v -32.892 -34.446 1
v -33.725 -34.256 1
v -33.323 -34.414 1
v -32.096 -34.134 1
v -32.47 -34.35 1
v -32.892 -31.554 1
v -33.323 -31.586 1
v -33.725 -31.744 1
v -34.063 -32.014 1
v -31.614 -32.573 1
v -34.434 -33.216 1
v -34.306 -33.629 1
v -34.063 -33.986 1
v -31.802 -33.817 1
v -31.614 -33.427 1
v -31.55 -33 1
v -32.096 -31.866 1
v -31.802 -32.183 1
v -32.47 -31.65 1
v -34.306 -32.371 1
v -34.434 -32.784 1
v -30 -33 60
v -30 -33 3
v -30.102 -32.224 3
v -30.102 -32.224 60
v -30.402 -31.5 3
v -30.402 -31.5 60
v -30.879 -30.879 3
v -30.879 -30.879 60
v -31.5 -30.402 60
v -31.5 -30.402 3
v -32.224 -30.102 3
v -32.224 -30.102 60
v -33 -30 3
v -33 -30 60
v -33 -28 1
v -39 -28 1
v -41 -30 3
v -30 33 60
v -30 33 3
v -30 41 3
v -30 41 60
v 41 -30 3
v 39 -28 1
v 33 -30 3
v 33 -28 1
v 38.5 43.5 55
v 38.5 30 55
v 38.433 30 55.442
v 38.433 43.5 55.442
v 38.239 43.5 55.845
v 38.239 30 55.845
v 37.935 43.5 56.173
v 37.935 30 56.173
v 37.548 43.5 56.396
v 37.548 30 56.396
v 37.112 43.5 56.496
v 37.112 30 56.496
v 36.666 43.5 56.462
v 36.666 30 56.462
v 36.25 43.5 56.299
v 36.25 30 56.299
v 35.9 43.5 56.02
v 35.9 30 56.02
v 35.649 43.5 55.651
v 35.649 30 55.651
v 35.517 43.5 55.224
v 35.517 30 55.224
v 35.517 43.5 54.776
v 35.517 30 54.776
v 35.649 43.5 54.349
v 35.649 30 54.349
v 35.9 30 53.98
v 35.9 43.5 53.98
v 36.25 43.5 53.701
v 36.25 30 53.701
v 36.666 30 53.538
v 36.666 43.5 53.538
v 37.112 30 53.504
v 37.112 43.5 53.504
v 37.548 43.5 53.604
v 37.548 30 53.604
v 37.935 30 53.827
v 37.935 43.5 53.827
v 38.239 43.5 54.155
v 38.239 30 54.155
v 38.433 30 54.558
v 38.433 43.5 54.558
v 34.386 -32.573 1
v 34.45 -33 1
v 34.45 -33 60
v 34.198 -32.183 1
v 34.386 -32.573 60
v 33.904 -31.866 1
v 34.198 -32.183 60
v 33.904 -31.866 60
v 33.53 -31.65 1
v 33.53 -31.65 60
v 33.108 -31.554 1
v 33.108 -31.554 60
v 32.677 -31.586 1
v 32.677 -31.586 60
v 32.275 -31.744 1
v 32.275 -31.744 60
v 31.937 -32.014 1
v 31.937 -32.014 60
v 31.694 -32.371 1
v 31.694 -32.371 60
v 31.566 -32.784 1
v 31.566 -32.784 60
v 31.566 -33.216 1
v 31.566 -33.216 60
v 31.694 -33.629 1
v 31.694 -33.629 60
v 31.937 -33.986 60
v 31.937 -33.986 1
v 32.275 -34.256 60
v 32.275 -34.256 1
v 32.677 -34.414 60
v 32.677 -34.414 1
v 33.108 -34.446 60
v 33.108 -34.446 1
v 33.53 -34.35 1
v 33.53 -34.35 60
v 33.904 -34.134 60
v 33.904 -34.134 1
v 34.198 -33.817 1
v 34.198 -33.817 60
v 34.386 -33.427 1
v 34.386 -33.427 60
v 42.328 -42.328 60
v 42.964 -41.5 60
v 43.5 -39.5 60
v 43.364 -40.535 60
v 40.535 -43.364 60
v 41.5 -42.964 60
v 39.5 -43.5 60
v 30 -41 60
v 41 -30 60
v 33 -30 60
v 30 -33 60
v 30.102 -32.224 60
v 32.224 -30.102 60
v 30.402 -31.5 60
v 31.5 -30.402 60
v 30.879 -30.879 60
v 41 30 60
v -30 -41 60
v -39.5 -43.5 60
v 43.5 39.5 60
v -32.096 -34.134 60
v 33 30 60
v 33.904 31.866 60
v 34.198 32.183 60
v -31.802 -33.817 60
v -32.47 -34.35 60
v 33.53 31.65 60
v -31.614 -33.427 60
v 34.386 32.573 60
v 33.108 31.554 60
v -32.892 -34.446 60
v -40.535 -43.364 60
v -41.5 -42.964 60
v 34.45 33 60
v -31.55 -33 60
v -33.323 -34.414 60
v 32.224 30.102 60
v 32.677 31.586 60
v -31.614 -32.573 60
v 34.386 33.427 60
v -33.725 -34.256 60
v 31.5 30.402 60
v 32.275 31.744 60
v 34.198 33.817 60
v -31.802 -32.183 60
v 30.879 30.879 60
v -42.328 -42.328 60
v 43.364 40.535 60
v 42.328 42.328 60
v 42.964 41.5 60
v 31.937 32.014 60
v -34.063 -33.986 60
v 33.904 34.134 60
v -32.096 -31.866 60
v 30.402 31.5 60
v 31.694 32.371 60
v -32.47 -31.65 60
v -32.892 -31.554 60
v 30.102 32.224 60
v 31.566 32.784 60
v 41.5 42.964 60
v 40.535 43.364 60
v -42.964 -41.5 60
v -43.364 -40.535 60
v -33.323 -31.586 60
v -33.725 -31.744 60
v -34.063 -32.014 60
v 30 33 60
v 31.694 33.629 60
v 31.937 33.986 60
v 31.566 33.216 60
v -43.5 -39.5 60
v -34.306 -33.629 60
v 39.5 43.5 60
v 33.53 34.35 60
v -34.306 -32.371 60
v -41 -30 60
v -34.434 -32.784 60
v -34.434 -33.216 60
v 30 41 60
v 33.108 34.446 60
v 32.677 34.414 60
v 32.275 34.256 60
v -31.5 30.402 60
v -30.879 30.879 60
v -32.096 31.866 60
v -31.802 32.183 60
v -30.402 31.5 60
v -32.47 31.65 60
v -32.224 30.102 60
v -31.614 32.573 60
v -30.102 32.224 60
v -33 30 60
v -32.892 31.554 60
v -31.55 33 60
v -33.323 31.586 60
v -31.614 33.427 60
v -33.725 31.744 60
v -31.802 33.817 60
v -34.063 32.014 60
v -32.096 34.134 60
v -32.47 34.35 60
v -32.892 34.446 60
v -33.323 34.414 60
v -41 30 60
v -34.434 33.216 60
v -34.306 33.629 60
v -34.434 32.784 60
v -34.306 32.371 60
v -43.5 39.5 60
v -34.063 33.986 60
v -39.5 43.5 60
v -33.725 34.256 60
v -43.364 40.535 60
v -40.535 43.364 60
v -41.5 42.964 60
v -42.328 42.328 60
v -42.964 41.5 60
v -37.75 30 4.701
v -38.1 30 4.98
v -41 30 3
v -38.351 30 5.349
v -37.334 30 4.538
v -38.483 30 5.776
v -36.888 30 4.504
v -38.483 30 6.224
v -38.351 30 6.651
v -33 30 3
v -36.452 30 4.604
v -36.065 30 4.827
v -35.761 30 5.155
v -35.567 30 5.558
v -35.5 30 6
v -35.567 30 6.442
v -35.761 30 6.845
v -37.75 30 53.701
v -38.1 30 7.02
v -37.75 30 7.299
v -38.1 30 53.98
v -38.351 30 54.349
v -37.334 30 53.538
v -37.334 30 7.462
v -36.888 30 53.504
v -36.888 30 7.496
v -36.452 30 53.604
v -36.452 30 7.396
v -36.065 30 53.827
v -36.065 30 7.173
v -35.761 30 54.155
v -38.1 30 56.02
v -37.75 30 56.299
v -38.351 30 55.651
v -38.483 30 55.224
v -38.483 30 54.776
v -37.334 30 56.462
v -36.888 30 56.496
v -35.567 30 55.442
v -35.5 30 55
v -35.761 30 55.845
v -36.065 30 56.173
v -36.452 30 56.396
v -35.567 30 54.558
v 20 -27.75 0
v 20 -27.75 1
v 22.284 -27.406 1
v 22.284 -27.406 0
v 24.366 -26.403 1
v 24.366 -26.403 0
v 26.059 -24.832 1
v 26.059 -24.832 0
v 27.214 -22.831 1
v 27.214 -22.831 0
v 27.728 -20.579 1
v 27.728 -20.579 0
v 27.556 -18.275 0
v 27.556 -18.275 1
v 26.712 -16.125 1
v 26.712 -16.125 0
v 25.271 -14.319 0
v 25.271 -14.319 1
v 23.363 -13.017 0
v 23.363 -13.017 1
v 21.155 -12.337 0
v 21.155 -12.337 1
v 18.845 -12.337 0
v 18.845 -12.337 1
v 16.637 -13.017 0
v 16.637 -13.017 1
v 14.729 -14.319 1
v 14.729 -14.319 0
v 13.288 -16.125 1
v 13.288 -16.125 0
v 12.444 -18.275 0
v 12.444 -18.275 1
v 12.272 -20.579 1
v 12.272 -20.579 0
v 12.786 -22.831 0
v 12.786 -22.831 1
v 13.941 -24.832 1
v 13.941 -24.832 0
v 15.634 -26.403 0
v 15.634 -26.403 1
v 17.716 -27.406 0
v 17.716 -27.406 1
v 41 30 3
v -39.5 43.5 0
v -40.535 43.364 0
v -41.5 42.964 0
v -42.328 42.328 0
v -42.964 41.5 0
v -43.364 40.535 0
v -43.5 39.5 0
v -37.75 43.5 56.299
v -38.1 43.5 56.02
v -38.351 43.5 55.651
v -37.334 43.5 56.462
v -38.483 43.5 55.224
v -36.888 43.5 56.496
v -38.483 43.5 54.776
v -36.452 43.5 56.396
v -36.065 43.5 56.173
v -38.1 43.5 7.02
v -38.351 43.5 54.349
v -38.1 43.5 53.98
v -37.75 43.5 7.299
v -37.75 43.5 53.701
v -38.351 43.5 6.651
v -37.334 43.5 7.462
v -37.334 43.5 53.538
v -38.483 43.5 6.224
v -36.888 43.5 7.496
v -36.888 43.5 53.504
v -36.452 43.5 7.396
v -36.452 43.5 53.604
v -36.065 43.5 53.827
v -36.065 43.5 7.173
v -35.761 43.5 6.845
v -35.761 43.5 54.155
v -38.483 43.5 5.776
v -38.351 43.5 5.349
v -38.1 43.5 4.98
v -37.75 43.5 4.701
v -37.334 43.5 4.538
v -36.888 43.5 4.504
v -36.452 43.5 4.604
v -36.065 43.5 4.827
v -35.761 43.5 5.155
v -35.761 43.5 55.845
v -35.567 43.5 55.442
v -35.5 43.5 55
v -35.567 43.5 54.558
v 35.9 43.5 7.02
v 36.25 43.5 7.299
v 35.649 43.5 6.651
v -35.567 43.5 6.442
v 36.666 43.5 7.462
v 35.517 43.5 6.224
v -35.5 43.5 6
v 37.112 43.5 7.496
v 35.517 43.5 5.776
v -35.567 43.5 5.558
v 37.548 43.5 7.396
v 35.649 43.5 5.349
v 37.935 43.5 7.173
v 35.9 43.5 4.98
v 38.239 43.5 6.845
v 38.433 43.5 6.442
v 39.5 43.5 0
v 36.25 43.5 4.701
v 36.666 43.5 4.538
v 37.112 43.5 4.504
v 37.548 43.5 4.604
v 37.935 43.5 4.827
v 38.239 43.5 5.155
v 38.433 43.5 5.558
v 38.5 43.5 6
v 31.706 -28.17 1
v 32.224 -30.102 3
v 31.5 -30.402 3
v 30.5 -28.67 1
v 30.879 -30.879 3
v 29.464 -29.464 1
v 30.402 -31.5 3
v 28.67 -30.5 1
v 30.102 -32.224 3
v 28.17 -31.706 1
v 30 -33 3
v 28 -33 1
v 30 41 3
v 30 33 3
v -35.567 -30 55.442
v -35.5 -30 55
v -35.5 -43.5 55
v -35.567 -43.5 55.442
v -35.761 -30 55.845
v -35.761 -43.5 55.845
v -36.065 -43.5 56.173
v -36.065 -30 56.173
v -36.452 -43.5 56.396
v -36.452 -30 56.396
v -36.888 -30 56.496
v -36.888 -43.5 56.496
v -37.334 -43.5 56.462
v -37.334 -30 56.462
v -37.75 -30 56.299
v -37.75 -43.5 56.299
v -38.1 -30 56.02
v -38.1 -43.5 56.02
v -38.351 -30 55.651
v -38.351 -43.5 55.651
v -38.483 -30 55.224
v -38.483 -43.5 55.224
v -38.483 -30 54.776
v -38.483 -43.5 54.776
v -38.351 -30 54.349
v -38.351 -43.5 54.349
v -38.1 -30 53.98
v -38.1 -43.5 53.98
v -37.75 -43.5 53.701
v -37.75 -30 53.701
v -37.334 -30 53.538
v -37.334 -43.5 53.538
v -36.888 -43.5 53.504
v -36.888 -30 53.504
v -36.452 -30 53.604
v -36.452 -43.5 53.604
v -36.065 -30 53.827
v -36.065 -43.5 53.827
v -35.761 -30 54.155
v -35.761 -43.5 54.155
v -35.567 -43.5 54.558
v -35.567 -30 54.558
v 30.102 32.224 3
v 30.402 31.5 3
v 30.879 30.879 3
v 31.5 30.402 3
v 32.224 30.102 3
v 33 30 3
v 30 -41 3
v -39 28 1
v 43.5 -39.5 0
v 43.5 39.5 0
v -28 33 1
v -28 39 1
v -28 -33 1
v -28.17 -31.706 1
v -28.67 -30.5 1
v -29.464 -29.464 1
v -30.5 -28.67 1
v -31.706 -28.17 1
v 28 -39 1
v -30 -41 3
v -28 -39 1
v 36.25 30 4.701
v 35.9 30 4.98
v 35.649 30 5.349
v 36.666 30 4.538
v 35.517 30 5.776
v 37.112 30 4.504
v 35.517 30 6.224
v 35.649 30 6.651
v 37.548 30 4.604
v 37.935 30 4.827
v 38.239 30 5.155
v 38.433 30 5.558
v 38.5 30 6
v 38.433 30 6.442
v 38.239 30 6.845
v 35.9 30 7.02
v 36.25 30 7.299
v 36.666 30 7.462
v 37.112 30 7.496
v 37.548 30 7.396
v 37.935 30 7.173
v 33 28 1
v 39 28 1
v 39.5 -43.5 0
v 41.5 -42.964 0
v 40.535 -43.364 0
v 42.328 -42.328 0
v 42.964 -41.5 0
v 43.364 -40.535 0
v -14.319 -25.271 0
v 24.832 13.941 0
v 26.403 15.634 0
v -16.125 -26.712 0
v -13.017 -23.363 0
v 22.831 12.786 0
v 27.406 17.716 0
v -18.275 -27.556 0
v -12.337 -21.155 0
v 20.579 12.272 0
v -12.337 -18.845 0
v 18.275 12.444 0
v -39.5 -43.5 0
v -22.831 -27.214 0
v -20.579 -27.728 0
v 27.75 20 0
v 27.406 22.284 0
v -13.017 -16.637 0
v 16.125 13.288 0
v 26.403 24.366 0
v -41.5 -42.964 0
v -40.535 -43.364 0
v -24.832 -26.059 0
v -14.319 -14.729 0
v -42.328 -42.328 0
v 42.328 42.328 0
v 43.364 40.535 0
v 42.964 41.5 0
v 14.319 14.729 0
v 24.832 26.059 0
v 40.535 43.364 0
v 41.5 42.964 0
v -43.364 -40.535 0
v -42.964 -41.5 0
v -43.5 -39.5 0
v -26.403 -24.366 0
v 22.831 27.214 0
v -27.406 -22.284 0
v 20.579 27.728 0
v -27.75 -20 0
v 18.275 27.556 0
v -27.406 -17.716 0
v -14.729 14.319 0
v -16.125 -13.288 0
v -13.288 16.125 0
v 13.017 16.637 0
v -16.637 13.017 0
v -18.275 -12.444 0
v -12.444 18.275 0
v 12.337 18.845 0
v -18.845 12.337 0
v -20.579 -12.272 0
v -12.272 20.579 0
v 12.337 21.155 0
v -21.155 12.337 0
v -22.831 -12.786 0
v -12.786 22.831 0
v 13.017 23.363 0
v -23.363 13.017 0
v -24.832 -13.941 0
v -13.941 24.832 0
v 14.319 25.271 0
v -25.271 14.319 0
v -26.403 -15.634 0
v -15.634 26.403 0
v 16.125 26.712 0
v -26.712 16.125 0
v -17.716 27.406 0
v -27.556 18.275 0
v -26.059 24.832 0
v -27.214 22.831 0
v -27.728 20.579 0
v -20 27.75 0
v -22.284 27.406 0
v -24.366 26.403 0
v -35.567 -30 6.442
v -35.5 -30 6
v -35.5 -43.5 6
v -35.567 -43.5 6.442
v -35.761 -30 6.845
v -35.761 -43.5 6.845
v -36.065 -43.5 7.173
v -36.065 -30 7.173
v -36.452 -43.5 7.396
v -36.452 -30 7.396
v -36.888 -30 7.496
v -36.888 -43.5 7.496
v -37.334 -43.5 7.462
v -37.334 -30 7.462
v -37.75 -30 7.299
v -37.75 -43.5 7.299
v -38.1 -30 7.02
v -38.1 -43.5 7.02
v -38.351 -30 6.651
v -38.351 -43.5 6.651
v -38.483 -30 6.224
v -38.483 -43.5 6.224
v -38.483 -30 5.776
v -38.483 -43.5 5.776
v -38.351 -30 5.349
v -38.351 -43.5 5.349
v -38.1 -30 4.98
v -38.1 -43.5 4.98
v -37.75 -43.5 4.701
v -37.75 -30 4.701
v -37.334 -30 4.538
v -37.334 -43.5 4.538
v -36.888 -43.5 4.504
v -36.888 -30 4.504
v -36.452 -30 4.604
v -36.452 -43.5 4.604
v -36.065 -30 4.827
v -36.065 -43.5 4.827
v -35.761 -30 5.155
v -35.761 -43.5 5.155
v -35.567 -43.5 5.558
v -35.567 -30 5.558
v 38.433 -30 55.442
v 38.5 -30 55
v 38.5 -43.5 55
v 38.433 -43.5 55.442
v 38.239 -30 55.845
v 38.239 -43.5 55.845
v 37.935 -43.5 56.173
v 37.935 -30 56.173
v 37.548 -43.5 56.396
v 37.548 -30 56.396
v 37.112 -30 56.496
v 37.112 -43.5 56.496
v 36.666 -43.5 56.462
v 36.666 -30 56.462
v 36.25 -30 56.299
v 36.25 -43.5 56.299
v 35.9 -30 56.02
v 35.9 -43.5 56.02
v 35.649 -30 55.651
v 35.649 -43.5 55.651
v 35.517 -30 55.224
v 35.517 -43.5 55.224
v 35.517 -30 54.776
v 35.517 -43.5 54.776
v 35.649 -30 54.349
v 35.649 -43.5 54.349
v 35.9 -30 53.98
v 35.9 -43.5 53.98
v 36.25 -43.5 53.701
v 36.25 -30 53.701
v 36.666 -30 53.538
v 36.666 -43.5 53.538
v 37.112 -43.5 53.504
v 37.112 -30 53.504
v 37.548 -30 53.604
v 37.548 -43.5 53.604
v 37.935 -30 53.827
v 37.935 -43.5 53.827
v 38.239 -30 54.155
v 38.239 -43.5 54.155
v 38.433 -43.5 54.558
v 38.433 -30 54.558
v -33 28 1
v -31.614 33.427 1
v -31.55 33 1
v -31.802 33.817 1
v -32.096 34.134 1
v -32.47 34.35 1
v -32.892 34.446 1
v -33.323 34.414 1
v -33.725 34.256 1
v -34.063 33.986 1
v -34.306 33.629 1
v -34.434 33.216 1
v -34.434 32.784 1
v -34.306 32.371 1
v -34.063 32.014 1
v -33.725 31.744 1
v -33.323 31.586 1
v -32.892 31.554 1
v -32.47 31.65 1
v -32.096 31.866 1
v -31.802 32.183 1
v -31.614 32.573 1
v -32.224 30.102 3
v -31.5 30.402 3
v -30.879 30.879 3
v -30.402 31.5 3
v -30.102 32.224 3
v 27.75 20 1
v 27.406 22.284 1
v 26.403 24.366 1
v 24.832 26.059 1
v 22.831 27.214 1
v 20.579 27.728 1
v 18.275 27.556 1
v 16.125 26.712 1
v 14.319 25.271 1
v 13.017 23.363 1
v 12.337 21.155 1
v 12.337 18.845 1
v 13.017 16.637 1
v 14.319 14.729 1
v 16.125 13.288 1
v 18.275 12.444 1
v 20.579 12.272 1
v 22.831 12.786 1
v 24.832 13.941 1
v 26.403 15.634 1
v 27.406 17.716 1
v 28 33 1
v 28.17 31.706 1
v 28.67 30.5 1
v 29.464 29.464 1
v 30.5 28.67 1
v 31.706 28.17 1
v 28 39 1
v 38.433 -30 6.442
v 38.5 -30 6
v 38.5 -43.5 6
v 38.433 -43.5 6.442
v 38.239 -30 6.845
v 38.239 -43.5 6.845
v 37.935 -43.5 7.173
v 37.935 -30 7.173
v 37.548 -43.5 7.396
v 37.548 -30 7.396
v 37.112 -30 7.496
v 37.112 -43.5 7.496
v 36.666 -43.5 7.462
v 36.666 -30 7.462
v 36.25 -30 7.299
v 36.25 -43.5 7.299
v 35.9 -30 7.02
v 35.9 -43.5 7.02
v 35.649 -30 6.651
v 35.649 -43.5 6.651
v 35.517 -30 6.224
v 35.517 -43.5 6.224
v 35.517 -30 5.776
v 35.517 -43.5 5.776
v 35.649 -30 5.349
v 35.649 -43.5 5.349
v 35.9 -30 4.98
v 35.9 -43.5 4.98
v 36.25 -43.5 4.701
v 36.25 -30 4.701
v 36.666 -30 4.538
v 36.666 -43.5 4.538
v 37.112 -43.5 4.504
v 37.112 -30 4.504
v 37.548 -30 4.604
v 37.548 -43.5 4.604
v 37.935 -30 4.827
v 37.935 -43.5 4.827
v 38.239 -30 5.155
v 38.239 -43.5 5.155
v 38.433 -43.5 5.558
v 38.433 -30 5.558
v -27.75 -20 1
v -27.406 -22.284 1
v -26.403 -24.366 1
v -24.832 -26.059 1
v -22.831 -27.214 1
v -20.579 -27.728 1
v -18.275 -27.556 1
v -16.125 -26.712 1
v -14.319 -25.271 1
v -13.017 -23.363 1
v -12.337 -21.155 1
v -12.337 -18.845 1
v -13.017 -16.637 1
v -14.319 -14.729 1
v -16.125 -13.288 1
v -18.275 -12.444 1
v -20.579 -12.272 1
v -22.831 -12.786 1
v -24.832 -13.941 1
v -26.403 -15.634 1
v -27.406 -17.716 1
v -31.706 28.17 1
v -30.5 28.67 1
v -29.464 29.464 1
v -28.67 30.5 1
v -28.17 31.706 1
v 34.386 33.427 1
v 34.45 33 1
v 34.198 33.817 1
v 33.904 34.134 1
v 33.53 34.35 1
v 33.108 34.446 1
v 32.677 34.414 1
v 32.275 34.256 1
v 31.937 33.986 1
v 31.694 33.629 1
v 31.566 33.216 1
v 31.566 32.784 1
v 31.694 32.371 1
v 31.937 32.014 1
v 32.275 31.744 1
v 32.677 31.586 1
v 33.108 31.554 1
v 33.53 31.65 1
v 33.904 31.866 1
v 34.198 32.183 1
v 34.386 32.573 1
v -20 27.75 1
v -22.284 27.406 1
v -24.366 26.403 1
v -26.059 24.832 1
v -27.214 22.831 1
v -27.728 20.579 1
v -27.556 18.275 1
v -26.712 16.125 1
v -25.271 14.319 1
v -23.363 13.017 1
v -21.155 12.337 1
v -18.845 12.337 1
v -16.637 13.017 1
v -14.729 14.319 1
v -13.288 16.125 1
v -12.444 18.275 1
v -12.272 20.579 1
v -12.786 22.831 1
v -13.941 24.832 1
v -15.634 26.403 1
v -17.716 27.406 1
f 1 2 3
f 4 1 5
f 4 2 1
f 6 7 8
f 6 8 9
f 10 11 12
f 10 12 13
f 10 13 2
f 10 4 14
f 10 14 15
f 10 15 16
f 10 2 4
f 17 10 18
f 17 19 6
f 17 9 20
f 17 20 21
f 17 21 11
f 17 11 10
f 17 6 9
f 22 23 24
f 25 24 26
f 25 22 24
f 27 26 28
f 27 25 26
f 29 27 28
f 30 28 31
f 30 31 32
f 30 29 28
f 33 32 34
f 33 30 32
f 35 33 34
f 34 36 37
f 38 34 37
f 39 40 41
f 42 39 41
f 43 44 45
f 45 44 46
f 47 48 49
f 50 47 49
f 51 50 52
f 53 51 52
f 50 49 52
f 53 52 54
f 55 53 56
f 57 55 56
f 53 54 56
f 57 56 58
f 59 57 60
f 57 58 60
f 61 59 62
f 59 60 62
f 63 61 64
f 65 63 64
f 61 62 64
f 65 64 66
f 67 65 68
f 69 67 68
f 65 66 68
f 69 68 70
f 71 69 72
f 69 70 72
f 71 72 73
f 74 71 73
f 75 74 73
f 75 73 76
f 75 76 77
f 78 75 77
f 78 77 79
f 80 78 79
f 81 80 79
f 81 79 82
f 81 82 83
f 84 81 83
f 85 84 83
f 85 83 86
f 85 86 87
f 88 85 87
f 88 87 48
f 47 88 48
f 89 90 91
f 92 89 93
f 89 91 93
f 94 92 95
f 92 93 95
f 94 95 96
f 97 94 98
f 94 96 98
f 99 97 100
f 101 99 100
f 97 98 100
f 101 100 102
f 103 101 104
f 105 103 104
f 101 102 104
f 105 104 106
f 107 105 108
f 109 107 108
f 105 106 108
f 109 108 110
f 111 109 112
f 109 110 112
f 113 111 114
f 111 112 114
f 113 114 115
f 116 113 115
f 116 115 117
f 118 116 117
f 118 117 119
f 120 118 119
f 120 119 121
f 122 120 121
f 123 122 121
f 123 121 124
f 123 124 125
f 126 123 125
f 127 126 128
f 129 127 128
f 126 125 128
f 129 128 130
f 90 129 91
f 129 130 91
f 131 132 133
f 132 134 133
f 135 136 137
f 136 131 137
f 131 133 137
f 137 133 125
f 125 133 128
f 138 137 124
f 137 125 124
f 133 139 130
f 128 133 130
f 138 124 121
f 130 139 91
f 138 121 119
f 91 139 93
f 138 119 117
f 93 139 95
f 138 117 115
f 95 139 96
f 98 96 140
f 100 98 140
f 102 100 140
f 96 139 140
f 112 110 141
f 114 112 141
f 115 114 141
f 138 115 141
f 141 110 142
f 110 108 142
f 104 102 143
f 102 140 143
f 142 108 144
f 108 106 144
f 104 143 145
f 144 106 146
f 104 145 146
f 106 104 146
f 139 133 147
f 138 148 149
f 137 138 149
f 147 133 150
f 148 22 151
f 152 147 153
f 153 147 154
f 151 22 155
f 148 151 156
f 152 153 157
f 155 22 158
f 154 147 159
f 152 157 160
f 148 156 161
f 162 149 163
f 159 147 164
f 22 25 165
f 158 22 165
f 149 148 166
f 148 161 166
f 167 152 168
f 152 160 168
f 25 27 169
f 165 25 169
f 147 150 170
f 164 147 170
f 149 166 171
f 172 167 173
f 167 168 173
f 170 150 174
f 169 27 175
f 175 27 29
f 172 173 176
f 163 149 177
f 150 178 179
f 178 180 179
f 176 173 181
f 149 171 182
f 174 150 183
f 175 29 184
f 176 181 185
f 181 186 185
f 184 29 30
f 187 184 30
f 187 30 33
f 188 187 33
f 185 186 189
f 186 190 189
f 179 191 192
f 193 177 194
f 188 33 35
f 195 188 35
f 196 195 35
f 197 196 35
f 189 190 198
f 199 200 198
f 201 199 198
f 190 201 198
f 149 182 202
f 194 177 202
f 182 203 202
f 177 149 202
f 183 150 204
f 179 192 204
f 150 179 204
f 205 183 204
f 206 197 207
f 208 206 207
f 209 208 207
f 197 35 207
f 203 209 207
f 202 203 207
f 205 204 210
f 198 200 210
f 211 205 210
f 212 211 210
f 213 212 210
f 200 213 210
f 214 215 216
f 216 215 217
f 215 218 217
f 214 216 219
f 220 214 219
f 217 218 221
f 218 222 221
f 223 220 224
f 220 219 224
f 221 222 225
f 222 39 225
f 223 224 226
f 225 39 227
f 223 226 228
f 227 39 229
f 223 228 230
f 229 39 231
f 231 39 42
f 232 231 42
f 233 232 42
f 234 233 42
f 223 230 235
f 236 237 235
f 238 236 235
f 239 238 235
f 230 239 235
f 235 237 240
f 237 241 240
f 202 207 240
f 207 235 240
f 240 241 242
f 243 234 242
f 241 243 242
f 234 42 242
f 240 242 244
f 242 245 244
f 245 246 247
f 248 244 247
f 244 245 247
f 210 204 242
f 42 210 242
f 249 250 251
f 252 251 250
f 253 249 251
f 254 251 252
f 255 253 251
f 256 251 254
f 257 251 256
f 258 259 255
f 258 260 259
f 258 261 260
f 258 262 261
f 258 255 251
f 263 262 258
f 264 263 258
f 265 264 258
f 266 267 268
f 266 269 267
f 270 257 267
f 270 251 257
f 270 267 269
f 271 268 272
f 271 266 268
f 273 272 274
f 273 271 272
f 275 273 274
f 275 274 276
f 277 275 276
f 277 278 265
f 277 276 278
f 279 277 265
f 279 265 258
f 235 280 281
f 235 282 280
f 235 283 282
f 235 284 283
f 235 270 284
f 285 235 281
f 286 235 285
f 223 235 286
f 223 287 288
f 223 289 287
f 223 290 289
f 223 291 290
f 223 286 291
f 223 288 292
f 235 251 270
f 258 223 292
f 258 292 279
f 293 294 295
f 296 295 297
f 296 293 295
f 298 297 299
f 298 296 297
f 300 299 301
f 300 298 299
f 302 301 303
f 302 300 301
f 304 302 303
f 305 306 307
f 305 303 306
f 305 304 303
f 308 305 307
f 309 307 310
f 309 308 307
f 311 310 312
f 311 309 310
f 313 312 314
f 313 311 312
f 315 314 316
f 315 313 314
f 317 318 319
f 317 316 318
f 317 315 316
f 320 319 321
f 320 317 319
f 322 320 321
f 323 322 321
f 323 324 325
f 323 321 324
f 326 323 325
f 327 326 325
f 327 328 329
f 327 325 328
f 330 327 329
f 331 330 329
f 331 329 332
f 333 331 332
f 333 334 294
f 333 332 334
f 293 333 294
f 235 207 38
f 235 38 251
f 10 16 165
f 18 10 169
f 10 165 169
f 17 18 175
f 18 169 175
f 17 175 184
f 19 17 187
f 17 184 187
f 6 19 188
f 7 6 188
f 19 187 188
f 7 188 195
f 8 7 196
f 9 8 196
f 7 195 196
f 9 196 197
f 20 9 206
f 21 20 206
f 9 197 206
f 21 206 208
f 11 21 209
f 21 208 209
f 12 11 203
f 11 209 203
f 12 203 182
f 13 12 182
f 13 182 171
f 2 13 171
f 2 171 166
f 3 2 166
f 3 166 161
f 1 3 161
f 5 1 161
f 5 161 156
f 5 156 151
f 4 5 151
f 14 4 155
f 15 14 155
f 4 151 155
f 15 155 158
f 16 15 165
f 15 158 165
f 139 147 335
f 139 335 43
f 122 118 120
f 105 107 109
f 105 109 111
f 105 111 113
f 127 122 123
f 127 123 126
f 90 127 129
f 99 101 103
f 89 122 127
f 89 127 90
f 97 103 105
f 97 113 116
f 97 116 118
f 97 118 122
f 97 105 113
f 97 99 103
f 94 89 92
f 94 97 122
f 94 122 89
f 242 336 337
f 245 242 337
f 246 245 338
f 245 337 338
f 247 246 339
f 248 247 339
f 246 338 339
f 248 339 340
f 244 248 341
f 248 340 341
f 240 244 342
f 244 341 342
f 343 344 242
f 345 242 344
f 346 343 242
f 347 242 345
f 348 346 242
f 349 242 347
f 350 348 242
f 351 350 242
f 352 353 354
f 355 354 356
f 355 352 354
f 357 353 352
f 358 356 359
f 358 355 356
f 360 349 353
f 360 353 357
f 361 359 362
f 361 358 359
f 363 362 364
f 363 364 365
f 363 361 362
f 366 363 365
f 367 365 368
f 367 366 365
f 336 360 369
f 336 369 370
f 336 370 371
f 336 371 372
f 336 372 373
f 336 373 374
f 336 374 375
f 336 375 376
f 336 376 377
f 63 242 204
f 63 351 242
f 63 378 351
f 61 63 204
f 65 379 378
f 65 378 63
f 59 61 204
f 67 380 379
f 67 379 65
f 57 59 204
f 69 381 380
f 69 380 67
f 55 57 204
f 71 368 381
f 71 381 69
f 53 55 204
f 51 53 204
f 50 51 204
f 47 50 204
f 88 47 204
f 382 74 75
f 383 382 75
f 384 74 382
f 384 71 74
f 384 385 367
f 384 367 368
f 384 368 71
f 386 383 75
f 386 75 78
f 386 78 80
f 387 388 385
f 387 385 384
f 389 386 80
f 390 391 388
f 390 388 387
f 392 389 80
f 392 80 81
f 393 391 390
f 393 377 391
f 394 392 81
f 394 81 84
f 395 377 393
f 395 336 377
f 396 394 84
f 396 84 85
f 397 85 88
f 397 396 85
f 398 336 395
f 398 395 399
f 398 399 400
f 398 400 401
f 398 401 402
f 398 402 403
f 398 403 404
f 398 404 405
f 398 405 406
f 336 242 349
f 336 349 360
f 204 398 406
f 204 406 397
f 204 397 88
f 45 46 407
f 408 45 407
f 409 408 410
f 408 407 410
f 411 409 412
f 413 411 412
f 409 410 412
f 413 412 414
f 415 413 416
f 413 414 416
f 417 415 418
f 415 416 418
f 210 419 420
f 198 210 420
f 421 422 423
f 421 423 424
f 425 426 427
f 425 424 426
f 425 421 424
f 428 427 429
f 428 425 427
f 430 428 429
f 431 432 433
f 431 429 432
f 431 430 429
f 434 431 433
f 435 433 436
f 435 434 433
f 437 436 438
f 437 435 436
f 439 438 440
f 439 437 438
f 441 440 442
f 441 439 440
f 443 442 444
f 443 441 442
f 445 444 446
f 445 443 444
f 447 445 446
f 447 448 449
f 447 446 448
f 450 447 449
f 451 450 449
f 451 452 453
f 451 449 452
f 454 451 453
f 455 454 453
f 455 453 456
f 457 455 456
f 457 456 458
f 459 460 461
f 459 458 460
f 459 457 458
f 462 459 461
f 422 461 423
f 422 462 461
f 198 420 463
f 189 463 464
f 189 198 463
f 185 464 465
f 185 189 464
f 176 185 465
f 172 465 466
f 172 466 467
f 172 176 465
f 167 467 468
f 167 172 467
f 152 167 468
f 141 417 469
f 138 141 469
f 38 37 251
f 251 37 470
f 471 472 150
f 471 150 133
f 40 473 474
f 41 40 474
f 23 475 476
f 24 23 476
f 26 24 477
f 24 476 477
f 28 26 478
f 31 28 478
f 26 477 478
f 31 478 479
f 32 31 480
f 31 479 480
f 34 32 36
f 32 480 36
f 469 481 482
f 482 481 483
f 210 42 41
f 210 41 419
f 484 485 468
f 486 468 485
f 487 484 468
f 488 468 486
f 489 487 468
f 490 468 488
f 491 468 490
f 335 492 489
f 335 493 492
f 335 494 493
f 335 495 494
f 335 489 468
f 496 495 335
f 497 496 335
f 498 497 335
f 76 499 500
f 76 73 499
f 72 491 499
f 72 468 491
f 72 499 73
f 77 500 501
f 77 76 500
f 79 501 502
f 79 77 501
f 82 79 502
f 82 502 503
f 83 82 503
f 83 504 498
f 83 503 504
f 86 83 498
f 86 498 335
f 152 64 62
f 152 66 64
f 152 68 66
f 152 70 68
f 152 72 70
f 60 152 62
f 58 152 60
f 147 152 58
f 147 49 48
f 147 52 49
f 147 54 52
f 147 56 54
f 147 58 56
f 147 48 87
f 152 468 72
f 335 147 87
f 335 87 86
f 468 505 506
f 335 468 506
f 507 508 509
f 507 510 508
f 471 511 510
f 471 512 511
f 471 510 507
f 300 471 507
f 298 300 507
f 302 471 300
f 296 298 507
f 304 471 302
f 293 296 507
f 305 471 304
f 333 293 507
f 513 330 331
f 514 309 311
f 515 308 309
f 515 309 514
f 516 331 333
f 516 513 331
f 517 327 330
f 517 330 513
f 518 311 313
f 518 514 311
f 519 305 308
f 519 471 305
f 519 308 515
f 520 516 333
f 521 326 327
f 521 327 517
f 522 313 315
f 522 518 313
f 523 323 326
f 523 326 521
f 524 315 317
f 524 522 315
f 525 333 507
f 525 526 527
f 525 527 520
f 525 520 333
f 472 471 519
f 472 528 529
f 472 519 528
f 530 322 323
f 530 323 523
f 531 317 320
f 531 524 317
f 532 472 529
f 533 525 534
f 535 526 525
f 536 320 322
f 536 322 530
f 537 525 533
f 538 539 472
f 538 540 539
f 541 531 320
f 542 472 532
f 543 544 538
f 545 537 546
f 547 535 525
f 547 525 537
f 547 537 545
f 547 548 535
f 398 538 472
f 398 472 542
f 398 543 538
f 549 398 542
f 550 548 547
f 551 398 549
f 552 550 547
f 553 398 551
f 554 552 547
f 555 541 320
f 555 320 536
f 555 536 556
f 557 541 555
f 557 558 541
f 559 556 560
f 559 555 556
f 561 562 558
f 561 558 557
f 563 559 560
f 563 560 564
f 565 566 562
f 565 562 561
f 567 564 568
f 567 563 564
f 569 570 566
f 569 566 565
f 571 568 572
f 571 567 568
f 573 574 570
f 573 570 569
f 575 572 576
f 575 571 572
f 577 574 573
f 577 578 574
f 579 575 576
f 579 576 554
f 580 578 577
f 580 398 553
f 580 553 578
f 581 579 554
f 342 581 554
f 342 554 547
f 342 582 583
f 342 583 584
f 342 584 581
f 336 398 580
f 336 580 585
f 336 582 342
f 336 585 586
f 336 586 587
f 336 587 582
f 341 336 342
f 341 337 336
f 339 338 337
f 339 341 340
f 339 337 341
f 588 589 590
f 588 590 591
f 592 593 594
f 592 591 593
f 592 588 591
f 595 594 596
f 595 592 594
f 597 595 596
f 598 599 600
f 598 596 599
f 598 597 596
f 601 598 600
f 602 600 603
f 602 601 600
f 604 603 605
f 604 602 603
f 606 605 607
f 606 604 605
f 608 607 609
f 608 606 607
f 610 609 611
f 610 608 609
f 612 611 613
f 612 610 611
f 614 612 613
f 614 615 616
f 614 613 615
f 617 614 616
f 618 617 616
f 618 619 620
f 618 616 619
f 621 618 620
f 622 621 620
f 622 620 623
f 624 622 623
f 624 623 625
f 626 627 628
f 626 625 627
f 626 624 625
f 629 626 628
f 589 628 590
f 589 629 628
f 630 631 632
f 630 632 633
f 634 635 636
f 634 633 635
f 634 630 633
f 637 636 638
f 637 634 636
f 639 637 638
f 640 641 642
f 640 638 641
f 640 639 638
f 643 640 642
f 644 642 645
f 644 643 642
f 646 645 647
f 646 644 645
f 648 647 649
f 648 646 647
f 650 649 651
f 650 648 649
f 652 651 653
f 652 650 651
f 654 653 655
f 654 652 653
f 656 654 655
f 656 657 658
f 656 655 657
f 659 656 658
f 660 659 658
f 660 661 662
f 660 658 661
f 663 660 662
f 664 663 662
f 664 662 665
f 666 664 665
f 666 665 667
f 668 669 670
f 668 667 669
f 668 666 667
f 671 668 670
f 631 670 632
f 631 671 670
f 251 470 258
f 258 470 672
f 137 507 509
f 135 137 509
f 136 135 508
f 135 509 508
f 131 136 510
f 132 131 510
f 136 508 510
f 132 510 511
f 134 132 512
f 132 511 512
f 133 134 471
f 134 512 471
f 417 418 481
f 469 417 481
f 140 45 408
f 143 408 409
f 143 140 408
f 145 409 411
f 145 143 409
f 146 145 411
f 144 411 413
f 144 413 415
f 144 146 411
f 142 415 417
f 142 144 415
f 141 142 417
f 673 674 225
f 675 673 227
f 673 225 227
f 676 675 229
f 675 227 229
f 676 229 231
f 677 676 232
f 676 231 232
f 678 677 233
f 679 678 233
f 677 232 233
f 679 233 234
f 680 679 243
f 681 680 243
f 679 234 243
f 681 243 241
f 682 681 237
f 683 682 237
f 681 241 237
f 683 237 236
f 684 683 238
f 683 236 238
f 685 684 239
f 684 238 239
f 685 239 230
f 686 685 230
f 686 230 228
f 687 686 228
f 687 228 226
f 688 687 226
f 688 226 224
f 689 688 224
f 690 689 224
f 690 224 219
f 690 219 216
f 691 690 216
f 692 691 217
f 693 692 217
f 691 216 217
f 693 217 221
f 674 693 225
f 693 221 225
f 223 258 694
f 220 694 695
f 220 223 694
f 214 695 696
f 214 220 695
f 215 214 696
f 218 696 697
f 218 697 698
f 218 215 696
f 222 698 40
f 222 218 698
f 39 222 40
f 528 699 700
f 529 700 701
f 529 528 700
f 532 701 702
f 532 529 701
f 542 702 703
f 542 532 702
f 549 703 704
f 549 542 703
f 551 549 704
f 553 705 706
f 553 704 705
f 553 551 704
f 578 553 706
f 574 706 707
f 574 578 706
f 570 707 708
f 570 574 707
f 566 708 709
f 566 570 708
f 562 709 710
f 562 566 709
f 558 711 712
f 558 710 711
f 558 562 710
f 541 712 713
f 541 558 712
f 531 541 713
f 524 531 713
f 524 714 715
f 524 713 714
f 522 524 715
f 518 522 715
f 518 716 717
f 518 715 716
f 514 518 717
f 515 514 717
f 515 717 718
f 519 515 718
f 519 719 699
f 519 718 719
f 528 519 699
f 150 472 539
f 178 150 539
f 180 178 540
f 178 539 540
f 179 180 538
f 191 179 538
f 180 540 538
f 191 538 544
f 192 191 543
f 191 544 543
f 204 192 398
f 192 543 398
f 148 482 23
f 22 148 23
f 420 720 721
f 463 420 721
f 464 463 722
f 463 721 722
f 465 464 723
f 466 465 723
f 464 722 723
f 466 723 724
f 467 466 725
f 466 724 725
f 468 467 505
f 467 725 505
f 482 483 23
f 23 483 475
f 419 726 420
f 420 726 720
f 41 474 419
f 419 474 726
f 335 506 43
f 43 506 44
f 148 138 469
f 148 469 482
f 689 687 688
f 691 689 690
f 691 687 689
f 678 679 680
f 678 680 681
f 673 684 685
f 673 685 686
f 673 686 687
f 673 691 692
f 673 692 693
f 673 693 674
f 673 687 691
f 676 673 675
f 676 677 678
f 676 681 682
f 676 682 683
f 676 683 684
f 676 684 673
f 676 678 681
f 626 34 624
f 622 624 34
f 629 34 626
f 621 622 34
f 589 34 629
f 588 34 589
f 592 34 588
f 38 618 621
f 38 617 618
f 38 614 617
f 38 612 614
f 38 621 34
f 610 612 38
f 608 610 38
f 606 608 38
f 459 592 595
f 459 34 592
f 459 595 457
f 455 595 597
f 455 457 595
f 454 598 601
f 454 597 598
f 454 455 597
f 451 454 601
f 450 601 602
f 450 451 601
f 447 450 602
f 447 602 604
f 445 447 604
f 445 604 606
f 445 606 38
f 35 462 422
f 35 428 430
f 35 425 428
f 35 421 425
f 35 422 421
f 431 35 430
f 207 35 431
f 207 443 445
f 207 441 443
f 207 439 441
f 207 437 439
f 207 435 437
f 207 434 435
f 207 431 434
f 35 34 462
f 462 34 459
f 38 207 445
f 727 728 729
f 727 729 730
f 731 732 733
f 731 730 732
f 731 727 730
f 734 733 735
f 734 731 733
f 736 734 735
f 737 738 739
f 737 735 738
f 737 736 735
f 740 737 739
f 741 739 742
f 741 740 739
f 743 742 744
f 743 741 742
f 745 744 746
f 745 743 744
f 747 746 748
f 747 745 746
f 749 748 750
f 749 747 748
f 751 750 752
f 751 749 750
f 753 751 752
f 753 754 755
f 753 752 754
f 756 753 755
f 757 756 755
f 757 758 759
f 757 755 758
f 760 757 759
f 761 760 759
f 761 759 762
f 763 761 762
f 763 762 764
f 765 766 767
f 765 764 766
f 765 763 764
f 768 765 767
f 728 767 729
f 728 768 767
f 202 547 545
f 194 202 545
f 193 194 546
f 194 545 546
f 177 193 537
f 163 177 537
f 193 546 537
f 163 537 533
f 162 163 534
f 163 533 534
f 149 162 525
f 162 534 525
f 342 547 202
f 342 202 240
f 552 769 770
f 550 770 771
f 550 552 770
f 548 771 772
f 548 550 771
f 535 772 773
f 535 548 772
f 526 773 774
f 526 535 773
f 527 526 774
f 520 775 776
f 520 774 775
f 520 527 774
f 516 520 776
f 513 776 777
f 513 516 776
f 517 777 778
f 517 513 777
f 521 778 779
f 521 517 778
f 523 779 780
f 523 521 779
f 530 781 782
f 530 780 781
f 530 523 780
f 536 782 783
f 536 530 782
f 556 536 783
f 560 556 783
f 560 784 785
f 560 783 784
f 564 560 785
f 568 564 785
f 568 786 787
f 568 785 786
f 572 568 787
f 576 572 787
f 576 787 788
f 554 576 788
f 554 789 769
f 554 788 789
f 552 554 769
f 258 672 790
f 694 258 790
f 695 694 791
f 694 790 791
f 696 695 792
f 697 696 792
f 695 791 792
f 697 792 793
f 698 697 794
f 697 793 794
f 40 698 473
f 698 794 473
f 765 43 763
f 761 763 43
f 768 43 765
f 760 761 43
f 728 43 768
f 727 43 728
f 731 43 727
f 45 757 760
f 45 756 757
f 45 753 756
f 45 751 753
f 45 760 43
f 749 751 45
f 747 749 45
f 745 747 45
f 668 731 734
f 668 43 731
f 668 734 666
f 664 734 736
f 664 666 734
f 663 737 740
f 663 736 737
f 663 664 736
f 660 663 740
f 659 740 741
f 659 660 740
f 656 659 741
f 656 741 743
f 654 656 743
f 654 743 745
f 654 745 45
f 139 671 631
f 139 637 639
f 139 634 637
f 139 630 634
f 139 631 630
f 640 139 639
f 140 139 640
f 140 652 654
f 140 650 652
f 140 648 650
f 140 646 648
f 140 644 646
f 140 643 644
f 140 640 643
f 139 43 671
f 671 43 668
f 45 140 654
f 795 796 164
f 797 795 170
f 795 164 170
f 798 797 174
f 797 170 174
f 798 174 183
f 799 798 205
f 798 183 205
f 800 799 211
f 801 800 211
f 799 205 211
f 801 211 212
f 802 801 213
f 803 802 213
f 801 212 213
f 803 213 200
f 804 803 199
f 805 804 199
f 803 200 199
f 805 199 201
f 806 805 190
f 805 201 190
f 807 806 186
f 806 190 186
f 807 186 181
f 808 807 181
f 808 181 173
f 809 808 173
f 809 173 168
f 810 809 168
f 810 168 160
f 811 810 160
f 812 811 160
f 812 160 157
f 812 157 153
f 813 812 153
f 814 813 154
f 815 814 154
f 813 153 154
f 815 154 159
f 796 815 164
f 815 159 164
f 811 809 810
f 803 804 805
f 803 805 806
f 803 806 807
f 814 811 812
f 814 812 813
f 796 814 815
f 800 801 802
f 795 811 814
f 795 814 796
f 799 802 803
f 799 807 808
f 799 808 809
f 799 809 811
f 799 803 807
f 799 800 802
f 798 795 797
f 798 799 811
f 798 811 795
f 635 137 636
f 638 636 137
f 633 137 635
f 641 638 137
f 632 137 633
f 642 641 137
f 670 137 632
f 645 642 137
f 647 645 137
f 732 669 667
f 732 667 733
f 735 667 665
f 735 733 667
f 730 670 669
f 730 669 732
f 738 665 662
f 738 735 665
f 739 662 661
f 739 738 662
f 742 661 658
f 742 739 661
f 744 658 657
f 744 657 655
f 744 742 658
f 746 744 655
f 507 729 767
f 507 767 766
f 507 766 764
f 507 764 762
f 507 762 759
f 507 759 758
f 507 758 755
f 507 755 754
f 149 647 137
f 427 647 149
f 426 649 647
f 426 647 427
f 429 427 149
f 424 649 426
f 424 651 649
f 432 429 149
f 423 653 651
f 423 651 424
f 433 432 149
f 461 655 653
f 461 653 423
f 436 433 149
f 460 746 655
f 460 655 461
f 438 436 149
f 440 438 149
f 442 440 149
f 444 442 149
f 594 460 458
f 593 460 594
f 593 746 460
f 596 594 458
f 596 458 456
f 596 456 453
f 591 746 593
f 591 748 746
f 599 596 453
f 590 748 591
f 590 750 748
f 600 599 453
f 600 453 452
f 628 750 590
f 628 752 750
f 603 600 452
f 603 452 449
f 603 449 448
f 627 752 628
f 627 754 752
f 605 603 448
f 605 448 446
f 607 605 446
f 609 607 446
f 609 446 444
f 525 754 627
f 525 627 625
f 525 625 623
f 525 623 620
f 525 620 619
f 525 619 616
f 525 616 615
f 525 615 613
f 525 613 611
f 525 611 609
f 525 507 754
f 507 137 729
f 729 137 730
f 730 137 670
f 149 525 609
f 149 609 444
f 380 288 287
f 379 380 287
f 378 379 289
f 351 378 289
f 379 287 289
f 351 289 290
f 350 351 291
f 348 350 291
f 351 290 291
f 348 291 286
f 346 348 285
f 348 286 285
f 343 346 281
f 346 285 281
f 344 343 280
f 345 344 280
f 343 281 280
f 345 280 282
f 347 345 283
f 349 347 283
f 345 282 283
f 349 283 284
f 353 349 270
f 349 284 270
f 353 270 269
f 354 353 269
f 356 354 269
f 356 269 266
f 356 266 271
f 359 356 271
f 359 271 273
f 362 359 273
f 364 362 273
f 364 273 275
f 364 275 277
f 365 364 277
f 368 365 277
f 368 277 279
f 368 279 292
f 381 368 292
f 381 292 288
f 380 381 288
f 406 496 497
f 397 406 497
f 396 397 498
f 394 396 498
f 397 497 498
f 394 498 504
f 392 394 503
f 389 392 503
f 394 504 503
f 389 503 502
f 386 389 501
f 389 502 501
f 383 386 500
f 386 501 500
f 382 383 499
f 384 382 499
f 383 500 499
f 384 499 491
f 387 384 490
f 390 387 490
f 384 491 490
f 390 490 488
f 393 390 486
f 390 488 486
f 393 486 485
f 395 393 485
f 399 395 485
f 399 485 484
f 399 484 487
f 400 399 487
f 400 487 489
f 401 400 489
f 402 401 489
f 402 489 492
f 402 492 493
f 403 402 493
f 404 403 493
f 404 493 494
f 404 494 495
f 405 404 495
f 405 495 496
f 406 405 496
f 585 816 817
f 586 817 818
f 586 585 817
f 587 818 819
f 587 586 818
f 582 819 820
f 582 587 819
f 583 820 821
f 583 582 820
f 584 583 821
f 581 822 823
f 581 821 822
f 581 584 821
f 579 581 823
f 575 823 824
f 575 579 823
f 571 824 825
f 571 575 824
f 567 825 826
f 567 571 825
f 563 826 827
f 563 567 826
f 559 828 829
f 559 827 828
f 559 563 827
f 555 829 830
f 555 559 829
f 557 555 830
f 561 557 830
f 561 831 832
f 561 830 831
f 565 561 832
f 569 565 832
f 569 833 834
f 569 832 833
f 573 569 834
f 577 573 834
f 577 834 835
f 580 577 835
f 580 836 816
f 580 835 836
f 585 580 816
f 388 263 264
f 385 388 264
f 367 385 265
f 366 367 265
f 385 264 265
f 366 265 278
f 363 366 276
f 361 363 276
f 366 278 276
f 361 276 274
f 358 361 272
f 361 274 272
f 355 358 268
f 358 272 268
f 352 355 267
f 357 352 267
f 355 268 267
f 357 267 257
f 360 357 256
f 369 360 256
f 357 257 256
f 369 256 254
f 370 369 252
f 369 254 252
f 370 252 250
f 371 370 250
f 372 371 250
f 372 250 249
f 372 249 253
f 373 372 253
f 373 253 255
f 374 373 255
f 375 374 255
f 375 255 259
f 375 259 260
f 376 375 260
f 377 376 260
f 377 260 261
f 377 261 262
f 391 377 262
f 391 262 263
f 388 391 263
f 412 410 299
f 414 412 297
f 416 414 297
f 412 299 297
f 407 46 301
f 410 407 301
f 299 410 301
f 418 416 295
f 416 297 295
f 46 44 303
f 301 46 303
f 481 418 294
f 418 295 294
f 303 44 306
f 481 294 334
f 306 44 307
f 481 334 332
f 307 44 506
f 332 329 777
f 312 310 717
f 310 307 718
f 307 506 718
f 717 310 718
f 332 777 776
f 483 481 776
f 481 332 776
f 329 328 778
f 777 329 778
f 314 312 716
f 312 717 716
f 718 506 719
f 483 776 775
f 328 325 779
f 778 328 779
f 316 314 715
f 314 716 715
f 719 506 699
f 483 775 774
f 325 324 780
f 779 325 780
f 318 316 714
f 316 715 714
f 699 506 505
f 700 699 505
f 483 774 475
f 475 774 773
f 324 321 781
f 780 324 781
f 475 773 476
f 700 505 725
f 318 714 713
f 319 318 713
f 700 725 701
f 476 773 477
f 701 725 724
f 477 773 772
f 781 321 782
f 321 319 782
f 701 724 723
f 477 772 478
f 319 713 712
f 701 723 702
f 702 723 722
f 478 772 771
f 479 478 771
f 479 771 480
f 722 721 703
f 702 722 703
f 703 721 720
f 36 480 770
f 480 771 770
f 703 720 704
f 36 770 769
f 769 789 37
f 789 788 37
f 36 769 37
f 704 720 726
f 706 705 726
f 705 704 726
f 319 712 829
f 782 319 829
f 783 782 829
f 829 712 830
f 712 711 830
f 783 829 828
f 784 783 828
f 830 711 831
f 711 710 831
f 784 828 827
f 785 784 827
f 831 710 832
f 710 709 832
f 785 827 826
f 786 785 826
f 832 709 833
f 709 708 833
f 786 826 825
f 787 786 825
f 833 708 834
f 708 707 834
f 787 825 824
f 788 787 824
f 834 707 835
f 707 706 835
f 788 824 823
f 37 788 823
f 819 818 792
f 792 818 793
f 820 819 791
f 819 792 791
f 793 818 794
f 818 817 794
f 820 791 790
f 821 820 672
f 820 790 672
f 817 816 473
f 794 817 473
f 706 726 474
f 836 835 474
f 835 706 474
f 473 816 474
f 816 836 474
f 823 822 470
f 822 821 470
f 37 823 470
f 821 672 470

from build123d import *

# Parameters (mm, degrees)
PAD_DEPTH            = 60
SKETCH001_R          = 1.45
POCKET_DEPTH         = 59
SKETCH002_R          = 1.5
POCKET001_DEPTH      = 13.501
POCKET001_DEPTH_BACK = -73.501
SKETCH003_R          = 7.75
POCKET002_DEPTH      = 333.774629
POLARPATTERN_COUNT   = 4
CHAMFER_SIZE         = 2


with BuildPart() as part:
    # Sketch → Pad (new body)
    with BuildSketch(Plane.XY):
        with BuildLine():
            Line((-39.5, 43.5), (39.5, 43.5))
            ThreePointArc((43.5, 39.5), (42.328427, 42.328427), (39.5, 43.5))
            Line((43.5, 39.5), (43.5, -39.5))
            ThreePointArc((39.5, -43.5), (42.328427, -42.328427), (43.5, -39.5))
            Line((39.5, -43.5), (-39.5, -43.5))
            ThreePointArc((-43.5, -39.5), (-42.328427, -42.328427), (-39.5, -43.5))
            Line((-43.5, -39.5), (-43.5, 39.5))
            ThreePointArc((-39.5, 43.5), (-42.328427, 42.328427), (-43.5, 39.5))
        make_face()
    extrude(amount=PAD_DEPTH)

    # Sketch001 (on Face10 of Pad) → Pocket (cut)
    with BuildSketch(Plane.XY.offset(60)):
        with Locations((-33, 33)):
            Circle(SKETCH001_R)
        with Locations((33, 33)):
            Circle(SKETCH001_R)
        with Locations((33, -33)):
            Circle(SKETCH001_R)
        with Locations((-33, -33)):
            Circle(SKETCH001_R)
        with BuildLine():
            Line((-30, 33), (-30, 41))
            Line((-30, 41), (30, 41))
            Line((30, 41), (30, 33))
            ThreePointArc((30, 33), (30.87868, 30.87868), (33, 30))
            Line((33, 30), (41, 30))
            Line((41, 30), (41, -30))
            Line((41, -30), (33, -30))
            ThreePointArc((33, -30), (30.87868, -30.87868), (30, -33))
            Line((30, -33), (30, -41))
            Line((30, -41), (-30, -41))
            Line((-30, -41), (-30, -33))
            ThreePointArc((-30, -33), (-30.87868, -30.87868), (-33, -30))
            Line((-33, -30), (-41, -30))
            Line((-41, -30), (-41, 30))
            Line((-41, 30), (-33, 30))
            ThreePointArc((-33, 30), (-30.87868, 30.87868), (-30, 33))
        make_face()
    extrude(amount=-POCKET_DEPTH, mode=Mode.SUBTRACT)

    # Sketch002 (on Face26 of Pocket) → Pocket001 (cut, two sides)
    with BuildSketch(Plane.XZ.offset(-30)) as pocket001_sk:
        with Locations((-37, 55)):
            Circle(SKETCH002_R)
        with Locations((37, 55)):
            Circle(SKETCH002_R)
        with Locations((-37, 6)):
            Circle(SKETCH002_R)
        with Locations((37, 6)):
            Circle(SKETCH002_R)
    extrude(amount=-POCKET001_DEPTH, mode=Mode.SUBTRACT)
    extrude(pocket001_sk.sketch, amount=-POCKET001_DEPTH_BACK, mode=Mode.SUBTRACT)

    # Sketch003 → Pocket002 (cut, through all)
    with BuildSketch(Plane.XY):
        with Locations((20, 20)):
            Circle(SKETCH003_R)
    pocket002 = extrude(amount=POCKET002_DEPTH, mode=Mode.SUBTRACT)

    # PolarPattern: Pocket002 ×4 about axis
    polarpattern_axis = Axis((0, 0, 0), (0, 0, 1))
    for i in range(1, POLARPATTERN_COUNT):
        add(pocket002.rotate(polarpattern_axis, i * 360 / POLARPATTERN_COUNT), mode=Mode.SUBTRACT)

    # Chamfer
    chamfer_edges = [part.edges().sort_by_distance(p)[0] for p in [
        (-37, 30, 1),
        (0, 41, 1),
        (30, 37, 1),
        (-41, 0, 1),
        (-30, -37, 1),
        (0, -41, 1),
        (41, 0, 1),
        (37, -30, 1),
    ]]
    chamfer(chamfer_edges, length=CHAMFER_SIZE)


solid = part.part
